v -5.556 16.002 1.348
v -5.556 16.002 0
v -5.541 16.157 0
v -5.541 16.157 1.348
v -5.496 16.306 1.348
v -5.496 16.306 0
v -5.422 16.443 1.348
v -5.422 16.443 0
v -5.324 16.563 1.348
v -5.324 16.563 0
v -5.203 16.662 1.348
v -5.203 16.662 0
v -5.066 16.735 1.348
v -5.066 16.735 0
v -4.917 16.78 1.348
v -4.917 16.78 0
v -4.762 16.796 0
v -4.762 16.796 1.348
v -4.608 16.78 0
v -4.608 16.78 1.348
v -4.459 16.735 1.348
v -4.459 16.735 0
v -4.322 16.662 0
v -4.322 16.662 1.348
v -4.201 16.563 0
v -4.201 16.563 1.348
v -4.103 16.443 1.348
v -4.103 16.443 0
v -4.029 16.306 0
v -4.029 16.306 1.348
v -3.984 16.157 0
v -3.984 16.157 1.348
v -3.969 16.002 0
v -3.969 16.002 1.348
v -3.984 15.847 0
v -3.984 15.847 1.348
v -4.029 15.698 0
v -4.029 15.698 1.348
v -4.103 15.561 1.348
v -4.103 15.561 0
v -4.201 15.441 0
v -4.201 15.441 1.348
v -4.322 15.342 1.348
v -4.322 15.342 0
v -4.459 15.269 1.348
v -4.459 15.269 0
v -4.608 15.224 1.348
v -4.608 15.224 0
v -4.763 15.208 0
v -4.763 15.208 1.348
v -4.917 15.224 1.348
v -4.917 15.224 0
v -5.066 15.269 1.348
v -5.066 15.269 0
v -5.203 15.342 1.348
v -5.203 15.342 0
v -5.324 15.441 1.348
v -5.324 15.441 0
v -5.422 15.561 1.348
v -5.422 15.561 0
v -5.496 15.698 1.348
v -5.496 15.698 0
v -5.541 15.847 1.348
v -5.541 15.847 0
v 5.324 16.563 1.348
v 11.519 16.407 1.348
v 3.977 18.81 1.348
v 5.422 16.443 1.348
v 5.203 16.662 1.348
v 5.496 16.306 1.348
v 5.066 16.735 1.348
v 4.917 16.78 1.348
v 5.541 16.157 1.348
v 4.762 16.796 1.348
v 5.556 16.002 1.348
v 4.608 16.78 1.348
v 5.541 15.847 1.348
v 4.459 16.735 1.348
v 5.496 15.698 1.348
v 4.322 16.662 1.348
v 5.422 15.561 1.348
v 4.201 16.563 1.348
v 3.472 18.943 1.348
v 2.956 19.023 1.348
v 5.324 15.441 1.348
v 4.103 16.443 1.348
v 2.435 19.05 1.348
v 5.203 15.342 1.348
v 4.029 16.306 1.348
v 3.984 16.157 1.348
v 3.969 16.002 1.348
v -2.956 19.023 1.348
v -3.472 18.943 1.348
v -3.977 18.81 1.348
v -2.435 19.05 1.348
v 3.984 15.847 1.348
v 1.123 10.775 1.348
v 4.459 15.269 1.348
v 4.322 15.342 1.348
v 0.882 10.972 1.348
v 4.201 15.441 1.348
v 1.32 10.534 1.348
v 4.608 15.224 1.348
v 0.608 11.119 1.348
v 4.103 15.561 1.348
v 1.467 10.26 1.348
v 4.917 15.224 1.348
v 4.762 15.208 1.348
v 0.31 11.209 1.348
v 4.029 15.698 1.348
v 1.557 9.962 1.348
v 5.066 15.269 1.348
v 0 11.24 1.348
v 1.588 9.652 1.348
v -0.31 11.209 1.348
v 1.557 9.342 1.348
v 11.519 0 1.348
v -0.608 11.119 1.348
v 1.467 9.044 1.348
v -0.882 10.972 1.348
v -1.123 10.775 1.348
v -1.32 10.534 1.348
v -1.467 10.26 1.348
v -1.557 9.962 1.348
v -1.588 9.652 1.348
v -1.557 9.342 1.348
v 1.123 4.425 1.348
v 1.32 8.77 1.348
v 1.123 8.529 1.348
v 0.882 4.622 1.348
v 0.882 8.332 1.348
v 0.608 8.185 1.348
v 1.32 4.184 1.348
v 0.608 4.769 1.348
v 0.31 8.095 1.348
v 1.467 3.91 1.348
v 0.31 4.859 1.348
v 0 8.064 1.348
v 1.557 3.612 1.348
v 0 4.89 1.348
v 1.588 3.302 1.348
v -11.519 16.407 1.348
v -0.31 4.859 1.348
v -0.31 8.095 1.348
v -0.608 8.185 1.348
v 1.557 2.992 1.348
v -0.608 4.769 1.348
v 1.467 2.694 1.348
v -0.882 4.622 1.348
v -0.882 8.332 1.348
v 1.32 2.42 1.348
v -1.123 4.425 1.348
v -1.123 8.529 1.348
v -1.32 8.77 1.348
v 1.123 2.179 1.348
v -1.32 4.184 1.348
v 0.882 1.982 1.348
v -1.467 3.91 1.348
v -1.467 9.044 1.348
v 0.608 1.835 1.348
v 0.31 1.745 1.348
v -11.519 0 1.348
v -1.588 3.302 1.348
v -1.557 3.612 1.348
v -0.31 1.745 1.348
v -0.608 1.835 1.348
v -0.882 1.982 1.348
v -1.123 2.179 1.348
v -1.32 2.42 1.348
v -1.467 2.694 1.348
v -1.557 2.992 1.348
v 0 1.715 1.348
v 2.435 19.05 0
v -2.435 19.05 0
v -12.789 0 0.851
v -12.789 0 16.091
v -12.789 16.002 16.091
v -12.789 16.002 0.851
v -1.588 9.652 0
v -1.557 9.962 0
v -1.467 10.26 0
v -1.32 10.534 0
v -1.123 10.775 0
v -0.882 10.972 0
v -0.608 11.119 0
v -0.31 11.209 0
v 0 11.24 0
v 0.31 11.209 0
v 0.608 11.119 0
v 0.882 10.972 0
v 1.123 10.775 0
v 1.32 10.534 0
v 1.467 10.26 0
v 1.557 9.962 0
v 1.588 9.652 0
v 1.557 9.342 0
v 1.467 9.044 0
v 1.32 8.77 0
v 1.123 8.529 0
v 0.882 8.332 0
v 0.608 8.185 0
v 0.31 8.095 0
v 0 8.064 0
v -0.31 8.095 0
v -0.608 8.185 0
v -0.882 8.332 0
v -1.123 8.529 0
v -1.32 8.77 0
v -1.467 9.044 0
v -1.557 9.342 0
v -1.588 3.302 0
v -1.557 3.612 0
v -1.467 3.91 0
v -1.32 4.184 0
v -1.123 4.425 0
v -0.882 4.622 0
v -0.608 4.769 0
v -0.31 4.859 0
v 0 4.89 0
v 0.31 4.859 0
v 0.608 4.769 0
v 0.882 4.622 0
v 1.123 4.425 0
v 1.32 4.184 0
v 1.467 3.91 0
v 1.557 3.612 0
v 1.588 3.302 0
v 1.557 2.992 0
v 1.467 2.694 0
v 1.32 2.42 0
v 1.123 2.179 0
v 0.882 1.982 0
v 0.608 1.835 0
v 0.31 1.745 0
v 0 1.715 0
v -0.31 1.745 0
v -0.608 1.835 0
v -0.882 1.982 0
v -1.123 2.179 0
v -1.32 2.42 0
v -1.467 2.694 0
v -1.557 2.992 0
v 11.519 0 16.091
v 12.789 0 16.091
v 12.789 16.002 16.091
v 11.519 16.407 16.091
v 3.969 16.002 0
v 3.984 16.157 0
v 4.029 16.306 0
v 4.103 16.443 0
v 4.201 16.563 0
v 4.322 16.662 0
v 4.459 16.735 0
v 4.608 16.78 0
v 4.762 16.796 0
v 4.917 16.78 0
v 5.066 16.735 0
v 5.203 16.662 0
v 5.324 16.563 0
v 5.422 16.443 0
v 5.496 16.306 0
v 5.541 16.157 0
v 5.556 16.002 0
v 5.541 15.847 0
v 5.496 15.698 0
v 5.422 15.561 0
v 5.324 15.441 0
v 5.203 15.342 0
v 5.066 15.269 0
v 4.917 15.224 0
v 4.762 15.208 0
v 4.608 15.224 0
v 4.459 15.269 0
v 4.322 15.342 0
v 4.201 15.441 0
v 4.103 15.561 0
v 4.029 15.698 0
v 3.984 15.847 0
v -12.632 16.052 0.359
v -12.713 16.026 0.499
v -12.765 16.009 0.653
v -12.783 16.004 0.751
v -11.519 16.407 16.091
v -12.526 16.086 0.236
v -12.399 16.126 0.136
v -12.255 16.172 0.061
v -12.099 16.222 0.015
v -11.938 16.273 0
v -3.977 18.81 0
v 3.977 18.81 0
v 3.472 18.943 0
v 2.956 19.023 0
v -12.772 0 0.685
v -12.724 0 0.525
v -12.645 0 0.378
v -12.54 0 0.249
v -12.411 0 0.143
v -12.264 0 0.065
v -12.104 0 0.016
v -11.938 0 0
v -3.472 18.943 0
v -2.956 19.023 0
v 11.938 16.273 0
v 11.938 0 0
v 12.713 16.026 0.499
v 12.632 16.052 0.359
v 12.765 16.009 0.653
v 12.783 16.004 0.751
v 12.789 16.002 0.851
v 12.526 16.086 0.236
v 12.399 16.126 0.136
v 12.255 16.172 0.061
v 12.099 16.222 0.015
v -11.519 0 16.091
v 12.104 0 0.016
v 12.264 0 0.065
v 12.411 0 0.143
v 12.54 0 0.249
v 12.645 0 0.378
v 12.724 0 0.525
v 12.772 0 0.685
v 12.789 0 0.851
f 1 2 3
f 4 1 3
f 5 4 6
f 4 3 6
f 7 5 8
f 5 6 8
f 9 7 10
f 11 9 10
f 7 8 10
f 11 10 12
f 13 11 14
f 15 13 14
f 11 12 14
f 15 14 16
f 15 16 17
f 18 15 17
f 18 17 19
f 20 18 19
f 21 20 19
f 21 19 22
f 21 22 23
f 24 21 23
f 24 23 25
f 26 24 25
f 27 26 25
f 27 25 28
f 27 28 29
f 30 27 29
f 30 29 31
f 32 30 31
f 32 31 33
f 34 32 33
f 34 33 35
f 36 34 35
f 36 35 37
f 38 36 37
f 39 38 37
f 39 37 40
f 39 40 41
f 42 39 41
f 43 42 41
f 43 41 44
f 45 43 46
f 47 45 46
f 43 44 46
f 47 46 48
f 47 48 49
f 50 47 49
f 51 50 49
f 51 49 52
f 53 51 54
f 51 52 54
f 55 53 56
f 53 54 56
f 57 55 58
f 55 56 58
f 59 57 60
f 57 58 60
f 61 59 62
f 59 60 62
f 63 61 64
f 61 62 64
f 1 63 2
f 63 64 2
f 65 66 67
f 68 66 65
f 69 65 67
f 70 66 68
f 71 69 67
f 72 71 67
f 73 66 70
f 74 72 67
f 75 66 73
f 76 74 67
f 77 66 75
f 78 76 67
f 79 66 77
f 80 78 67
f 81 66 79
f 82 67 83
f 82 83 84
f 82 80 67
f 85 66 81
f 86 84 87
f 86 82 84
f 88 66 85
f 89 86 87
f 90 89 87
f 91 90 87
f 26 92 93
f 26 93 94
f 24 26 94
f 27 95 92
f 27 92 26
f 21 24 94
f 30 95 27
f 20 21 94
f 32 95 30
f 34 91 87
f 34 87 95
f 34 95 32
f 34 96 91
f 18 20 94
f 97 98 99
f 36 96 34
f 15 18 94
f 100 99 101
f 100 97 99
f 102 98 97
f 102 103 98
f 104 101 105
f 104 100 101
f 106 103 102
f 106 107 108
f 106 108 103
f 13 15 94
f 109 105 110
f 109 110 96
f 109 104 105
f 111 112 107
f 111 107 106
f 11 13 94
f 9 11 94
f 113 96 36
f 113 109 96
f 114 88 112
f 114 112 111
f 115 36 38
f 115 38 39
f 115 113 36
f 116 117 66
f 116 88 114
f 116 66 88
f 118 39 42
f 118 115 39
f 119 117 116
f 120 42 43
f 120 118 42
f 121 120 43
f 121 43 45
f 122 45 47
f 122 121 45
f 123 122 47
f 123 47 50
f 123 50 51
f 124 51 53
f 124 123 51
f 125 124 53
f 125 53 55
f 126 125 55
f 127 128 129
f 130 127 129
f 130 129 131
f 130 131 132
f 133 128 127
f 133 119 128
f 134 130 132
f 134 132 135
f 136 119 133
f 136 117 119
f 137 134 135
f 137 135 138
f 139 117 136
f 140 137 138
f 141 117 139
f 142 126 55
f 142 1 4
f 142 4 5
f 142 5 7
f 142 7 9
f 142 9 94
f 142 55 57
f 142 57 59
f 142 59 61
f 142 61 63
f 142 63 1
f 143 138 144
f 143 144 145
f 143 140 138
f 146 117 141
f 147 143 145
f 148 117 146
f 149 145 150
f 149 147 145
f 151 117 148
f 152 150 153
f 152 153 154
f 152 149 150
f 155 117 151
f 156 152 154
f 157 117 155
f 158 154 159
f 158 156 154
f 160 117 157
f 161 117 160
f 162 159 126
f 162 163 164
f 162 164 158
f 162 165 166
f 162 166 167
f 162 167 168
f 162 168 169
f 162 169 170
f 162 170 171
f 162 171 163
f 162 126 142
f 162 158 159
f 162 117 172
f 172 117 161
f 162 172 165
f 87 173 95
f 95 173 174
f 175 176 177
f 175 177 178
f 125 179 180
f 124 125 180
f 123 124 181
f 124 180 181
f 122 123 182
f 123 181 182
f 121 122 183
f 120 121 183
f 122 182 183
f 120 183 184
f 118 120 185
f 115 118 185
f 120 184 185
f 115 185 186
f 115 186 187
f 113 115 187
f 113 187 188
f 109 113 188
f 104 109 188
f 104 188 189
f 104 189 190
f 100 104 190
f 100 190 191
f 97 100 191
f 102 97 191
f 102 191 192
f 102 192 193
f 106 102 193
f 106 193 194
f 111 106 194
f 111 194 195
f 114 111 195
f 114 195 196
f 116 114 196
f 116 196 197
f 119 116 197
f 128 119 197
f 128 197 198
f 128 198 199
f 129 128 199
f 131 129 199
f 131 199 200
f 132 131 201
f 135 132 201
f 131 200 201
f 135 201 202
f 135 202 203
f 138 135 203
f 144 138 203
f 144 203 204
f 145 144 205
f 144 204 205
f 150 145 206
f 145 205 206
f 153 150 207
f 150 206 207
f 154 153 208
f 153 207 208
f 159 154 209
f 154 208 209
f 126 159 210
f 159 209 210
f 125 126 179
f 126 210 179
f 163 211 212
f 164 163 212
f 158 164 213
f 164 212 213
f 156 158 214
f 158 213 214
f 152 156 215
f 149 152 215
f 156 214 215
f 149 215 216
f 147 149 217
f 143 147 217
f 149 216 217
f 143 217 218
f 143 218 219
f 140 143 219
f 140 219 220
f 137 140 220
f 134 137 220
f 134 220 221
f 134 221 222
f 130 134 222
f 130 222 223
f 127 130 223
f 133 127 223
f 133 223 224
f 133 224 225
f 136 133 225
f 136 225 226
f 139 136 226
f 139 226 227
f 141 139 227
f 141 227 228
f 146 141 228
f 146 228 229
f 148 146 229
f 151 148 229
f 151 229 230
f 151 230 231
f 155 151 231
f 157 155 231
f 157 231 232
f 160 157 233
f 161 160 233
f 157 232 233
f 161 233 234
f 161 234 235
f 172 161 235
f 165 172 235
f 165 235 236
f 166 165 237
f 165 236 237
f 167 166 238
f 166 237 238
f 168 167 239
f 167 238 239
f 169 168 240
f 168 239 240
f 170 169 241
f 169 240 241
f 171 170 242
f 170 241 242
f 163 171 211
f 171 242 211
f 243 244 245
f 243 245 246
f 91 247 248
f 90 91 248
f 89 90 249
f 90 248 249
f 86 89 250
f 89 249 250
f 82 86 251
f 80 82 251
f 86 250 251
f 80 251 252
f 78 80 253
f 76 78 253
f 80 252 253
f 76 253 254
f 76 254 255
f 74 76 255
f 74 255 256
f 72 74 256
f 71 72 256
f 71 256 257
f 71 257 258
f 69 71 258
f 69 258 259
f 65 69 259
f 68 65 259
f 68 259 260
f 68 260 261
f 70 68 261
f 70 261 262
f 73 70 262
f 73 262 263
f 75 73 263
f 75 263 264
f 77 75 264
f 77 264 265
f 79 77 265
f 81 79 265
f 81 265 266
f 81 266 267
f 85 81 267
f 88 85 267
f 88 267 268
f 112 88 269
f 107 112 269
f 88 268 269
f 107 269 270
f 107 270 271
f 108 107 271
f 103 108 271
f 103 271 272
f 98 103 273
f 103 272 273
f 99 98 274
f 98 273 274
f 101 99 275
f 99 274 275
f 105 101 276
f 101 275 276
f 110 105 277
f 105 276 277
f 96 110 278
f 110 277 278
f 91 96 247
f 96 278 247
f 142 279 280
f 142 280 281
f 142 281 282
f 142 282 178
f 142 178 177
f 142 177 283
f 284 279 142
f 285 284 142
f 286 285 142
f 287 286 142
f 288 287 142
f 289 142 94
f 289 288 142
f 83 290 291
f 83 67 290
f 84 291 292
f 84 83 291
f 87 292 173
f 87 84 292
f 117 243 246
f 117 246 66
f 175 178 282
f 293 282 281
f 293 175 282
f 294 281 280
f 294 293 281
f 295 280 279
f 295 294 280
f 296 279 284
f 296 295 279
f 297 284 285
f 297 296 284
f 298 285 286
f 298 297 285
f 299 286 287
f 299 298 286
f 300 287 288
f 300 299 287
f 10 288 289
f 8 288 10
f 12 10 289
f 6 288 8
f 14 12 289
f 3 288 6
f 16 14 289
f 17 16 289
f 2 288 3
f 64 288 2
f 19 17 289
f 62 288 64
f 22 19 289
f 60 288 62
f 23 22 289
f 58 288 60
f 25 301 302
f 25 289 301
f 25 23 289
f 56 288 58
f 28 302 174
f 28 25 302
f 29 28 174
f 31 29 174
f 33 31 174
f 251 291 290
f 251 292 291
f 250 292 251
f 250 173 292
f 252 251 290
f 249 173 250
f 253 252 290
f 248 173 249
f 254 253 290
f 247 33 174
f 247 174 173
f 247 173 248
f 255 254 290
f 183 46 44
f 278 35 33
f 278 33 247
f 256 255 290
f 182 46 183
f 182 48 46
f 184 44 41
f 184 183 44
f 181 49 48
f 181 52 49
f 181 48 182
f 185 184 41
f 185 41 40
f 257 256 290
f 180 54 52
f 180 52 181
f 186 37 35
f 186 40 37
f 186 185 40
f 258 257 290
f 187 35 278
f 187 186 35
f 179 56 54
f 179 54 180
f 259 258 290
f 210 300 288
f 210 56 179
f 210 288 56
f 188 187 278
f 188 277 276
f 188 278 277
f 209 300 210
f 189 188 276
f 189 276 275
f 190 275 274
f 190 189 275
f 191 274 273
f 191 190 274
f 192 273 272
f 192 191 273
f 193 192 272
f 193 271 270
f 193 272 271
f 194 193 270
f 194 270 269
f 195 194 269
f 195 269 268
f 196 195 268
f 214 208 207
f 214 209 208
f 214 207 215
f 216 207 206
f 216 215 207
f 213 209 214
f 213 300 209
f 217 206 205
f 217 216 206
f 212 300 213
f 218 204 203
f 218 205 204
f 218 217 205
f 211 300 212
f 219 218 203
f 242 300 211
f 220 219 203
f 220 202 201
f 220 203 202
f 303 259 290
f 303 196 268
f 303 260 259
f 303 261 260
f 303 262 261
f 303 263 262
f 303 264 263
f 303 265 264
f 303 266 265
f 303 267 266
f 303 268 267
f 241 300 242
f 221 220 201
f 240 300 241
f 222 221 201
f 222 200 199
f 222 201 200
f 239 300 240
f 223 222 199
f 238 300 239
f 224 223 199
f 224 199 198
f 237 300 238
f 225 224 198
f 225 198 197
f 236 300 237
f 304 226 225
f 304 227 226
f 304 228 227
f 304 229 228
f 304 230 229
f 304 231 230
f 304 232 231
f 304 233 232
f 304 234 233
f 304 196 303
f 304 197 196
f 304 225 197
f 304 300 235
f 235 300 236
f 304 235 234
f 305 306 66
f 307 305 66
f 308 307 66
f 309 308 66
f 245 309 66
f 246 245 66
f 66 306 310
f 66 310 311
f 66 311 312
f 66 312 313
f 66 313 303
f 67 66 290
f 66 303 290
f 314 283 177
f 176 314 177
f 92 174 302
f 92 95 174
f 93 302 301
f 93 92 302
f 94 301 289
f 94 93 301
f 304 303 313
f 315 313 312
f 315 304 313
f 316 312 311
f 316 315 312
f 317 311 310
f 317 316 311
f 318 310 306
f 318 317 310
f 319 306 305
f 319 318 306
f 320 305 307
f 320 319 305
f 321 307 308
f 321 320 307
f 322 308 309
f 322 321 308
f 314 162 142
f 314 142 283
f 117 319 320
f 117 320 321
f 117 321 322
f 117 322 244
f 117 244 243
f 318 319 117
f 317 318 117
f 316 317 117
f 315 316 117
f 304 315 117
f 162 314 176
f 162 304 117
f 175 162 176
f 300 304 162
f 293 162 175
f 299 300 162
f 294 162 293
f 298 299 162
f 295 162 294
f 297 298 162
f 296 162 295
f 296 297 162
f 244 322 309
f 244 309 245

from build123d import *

# Parameters (mm, degrees)
BOSS_EXTRUDE1_DEPTH = 19.05
SKETCH9_R           = 1.5875
SKETCH9_R_2         = 0.79375
CUT_EXTRUDE3_DEPTH  = 29.02437948
FILLET1_R           = 5.08


with BuildPart() as part:
    # Sketch8 → Boss-Extrude1 (new body)
    with BuildSketch(Plane(origin=(0, 0, 0), x_dir=(1, 0, 0), z_dir=(0, 1, 0))):
        with BuildLine():
            Line((-11.938, 0), (11.938, 0))
            ThreePointArc((11.938, 0), (12.539558645, -0.249173749), (12.788732394, -0.850732394))
            Line((12.788732394, -0.850732394), (12.788732394, -16.090732394))
            Line((12.788732394, -16.090732394), (11.518732394, -16.090732394))
            Line((11.518732394, -16.090732394), (11.518732394, -1.348144756))
            Line((11.518732394, -1.348144756), (-11.518727516, -1.348144756))
            Line((-11.518727516, -1.348144756), (-11.518727516, -16.090732394))
            Line((-11.518727516, -16.090732394), (-12.788727516, -16.090732394))
            Line((-12.788727516, -16.090732394), (-12.788727516, -0.850732394))
            ThreePointArc((-12.788727516, -0.850732394), (-12.539558645, -0.249173749), (-11.938, 0))
        make_face()
    extrude(amount=BOSS_EXTRUDE1_DEPTH)

    # Sketch9 → Cut-Extrude3 (cut, through all)
    with BuildSketch(Plane(origin=(0, 0, 0), x_dir=(-1, 0, 0), z_dir=(0, 0, -1))):
        with Locations((0, 9.652)):
            Circle(SKETCH9_R)
        with Locations((0, 3.302)):
            Circle(SKETCH9_R)
        with Locations((-4.7625, 16.002)):
            Circle(SKETCH9_R_2)
        with Locations((4.7625, 16.002)):
            Circle(SKETCH9_R_2)
        Polygon((-12.788732394, 16.002), (-3.224577063, 19.05), (-12.788732394, 19.05), align=None)
        Polygon((12.788732394, 16.002), (3.224577063, 19.05), (12.788729955, 19.05), align=None)
    extrude(amount=-CUT_EXTRUDE3_DEPTH, mode=Mode.SUBTRACT)

    # Fillet1
    fillet1_edges = [part.edges().sort_by_distance(p)[0] for p in [
        (3.224577063, 19.05, 0.674072378),
        (-3.224577063, 19.05, 0.674072378),
    ]]
    fillet(fillet1_edges, radius=FILLET1_R)


solid = part.part
